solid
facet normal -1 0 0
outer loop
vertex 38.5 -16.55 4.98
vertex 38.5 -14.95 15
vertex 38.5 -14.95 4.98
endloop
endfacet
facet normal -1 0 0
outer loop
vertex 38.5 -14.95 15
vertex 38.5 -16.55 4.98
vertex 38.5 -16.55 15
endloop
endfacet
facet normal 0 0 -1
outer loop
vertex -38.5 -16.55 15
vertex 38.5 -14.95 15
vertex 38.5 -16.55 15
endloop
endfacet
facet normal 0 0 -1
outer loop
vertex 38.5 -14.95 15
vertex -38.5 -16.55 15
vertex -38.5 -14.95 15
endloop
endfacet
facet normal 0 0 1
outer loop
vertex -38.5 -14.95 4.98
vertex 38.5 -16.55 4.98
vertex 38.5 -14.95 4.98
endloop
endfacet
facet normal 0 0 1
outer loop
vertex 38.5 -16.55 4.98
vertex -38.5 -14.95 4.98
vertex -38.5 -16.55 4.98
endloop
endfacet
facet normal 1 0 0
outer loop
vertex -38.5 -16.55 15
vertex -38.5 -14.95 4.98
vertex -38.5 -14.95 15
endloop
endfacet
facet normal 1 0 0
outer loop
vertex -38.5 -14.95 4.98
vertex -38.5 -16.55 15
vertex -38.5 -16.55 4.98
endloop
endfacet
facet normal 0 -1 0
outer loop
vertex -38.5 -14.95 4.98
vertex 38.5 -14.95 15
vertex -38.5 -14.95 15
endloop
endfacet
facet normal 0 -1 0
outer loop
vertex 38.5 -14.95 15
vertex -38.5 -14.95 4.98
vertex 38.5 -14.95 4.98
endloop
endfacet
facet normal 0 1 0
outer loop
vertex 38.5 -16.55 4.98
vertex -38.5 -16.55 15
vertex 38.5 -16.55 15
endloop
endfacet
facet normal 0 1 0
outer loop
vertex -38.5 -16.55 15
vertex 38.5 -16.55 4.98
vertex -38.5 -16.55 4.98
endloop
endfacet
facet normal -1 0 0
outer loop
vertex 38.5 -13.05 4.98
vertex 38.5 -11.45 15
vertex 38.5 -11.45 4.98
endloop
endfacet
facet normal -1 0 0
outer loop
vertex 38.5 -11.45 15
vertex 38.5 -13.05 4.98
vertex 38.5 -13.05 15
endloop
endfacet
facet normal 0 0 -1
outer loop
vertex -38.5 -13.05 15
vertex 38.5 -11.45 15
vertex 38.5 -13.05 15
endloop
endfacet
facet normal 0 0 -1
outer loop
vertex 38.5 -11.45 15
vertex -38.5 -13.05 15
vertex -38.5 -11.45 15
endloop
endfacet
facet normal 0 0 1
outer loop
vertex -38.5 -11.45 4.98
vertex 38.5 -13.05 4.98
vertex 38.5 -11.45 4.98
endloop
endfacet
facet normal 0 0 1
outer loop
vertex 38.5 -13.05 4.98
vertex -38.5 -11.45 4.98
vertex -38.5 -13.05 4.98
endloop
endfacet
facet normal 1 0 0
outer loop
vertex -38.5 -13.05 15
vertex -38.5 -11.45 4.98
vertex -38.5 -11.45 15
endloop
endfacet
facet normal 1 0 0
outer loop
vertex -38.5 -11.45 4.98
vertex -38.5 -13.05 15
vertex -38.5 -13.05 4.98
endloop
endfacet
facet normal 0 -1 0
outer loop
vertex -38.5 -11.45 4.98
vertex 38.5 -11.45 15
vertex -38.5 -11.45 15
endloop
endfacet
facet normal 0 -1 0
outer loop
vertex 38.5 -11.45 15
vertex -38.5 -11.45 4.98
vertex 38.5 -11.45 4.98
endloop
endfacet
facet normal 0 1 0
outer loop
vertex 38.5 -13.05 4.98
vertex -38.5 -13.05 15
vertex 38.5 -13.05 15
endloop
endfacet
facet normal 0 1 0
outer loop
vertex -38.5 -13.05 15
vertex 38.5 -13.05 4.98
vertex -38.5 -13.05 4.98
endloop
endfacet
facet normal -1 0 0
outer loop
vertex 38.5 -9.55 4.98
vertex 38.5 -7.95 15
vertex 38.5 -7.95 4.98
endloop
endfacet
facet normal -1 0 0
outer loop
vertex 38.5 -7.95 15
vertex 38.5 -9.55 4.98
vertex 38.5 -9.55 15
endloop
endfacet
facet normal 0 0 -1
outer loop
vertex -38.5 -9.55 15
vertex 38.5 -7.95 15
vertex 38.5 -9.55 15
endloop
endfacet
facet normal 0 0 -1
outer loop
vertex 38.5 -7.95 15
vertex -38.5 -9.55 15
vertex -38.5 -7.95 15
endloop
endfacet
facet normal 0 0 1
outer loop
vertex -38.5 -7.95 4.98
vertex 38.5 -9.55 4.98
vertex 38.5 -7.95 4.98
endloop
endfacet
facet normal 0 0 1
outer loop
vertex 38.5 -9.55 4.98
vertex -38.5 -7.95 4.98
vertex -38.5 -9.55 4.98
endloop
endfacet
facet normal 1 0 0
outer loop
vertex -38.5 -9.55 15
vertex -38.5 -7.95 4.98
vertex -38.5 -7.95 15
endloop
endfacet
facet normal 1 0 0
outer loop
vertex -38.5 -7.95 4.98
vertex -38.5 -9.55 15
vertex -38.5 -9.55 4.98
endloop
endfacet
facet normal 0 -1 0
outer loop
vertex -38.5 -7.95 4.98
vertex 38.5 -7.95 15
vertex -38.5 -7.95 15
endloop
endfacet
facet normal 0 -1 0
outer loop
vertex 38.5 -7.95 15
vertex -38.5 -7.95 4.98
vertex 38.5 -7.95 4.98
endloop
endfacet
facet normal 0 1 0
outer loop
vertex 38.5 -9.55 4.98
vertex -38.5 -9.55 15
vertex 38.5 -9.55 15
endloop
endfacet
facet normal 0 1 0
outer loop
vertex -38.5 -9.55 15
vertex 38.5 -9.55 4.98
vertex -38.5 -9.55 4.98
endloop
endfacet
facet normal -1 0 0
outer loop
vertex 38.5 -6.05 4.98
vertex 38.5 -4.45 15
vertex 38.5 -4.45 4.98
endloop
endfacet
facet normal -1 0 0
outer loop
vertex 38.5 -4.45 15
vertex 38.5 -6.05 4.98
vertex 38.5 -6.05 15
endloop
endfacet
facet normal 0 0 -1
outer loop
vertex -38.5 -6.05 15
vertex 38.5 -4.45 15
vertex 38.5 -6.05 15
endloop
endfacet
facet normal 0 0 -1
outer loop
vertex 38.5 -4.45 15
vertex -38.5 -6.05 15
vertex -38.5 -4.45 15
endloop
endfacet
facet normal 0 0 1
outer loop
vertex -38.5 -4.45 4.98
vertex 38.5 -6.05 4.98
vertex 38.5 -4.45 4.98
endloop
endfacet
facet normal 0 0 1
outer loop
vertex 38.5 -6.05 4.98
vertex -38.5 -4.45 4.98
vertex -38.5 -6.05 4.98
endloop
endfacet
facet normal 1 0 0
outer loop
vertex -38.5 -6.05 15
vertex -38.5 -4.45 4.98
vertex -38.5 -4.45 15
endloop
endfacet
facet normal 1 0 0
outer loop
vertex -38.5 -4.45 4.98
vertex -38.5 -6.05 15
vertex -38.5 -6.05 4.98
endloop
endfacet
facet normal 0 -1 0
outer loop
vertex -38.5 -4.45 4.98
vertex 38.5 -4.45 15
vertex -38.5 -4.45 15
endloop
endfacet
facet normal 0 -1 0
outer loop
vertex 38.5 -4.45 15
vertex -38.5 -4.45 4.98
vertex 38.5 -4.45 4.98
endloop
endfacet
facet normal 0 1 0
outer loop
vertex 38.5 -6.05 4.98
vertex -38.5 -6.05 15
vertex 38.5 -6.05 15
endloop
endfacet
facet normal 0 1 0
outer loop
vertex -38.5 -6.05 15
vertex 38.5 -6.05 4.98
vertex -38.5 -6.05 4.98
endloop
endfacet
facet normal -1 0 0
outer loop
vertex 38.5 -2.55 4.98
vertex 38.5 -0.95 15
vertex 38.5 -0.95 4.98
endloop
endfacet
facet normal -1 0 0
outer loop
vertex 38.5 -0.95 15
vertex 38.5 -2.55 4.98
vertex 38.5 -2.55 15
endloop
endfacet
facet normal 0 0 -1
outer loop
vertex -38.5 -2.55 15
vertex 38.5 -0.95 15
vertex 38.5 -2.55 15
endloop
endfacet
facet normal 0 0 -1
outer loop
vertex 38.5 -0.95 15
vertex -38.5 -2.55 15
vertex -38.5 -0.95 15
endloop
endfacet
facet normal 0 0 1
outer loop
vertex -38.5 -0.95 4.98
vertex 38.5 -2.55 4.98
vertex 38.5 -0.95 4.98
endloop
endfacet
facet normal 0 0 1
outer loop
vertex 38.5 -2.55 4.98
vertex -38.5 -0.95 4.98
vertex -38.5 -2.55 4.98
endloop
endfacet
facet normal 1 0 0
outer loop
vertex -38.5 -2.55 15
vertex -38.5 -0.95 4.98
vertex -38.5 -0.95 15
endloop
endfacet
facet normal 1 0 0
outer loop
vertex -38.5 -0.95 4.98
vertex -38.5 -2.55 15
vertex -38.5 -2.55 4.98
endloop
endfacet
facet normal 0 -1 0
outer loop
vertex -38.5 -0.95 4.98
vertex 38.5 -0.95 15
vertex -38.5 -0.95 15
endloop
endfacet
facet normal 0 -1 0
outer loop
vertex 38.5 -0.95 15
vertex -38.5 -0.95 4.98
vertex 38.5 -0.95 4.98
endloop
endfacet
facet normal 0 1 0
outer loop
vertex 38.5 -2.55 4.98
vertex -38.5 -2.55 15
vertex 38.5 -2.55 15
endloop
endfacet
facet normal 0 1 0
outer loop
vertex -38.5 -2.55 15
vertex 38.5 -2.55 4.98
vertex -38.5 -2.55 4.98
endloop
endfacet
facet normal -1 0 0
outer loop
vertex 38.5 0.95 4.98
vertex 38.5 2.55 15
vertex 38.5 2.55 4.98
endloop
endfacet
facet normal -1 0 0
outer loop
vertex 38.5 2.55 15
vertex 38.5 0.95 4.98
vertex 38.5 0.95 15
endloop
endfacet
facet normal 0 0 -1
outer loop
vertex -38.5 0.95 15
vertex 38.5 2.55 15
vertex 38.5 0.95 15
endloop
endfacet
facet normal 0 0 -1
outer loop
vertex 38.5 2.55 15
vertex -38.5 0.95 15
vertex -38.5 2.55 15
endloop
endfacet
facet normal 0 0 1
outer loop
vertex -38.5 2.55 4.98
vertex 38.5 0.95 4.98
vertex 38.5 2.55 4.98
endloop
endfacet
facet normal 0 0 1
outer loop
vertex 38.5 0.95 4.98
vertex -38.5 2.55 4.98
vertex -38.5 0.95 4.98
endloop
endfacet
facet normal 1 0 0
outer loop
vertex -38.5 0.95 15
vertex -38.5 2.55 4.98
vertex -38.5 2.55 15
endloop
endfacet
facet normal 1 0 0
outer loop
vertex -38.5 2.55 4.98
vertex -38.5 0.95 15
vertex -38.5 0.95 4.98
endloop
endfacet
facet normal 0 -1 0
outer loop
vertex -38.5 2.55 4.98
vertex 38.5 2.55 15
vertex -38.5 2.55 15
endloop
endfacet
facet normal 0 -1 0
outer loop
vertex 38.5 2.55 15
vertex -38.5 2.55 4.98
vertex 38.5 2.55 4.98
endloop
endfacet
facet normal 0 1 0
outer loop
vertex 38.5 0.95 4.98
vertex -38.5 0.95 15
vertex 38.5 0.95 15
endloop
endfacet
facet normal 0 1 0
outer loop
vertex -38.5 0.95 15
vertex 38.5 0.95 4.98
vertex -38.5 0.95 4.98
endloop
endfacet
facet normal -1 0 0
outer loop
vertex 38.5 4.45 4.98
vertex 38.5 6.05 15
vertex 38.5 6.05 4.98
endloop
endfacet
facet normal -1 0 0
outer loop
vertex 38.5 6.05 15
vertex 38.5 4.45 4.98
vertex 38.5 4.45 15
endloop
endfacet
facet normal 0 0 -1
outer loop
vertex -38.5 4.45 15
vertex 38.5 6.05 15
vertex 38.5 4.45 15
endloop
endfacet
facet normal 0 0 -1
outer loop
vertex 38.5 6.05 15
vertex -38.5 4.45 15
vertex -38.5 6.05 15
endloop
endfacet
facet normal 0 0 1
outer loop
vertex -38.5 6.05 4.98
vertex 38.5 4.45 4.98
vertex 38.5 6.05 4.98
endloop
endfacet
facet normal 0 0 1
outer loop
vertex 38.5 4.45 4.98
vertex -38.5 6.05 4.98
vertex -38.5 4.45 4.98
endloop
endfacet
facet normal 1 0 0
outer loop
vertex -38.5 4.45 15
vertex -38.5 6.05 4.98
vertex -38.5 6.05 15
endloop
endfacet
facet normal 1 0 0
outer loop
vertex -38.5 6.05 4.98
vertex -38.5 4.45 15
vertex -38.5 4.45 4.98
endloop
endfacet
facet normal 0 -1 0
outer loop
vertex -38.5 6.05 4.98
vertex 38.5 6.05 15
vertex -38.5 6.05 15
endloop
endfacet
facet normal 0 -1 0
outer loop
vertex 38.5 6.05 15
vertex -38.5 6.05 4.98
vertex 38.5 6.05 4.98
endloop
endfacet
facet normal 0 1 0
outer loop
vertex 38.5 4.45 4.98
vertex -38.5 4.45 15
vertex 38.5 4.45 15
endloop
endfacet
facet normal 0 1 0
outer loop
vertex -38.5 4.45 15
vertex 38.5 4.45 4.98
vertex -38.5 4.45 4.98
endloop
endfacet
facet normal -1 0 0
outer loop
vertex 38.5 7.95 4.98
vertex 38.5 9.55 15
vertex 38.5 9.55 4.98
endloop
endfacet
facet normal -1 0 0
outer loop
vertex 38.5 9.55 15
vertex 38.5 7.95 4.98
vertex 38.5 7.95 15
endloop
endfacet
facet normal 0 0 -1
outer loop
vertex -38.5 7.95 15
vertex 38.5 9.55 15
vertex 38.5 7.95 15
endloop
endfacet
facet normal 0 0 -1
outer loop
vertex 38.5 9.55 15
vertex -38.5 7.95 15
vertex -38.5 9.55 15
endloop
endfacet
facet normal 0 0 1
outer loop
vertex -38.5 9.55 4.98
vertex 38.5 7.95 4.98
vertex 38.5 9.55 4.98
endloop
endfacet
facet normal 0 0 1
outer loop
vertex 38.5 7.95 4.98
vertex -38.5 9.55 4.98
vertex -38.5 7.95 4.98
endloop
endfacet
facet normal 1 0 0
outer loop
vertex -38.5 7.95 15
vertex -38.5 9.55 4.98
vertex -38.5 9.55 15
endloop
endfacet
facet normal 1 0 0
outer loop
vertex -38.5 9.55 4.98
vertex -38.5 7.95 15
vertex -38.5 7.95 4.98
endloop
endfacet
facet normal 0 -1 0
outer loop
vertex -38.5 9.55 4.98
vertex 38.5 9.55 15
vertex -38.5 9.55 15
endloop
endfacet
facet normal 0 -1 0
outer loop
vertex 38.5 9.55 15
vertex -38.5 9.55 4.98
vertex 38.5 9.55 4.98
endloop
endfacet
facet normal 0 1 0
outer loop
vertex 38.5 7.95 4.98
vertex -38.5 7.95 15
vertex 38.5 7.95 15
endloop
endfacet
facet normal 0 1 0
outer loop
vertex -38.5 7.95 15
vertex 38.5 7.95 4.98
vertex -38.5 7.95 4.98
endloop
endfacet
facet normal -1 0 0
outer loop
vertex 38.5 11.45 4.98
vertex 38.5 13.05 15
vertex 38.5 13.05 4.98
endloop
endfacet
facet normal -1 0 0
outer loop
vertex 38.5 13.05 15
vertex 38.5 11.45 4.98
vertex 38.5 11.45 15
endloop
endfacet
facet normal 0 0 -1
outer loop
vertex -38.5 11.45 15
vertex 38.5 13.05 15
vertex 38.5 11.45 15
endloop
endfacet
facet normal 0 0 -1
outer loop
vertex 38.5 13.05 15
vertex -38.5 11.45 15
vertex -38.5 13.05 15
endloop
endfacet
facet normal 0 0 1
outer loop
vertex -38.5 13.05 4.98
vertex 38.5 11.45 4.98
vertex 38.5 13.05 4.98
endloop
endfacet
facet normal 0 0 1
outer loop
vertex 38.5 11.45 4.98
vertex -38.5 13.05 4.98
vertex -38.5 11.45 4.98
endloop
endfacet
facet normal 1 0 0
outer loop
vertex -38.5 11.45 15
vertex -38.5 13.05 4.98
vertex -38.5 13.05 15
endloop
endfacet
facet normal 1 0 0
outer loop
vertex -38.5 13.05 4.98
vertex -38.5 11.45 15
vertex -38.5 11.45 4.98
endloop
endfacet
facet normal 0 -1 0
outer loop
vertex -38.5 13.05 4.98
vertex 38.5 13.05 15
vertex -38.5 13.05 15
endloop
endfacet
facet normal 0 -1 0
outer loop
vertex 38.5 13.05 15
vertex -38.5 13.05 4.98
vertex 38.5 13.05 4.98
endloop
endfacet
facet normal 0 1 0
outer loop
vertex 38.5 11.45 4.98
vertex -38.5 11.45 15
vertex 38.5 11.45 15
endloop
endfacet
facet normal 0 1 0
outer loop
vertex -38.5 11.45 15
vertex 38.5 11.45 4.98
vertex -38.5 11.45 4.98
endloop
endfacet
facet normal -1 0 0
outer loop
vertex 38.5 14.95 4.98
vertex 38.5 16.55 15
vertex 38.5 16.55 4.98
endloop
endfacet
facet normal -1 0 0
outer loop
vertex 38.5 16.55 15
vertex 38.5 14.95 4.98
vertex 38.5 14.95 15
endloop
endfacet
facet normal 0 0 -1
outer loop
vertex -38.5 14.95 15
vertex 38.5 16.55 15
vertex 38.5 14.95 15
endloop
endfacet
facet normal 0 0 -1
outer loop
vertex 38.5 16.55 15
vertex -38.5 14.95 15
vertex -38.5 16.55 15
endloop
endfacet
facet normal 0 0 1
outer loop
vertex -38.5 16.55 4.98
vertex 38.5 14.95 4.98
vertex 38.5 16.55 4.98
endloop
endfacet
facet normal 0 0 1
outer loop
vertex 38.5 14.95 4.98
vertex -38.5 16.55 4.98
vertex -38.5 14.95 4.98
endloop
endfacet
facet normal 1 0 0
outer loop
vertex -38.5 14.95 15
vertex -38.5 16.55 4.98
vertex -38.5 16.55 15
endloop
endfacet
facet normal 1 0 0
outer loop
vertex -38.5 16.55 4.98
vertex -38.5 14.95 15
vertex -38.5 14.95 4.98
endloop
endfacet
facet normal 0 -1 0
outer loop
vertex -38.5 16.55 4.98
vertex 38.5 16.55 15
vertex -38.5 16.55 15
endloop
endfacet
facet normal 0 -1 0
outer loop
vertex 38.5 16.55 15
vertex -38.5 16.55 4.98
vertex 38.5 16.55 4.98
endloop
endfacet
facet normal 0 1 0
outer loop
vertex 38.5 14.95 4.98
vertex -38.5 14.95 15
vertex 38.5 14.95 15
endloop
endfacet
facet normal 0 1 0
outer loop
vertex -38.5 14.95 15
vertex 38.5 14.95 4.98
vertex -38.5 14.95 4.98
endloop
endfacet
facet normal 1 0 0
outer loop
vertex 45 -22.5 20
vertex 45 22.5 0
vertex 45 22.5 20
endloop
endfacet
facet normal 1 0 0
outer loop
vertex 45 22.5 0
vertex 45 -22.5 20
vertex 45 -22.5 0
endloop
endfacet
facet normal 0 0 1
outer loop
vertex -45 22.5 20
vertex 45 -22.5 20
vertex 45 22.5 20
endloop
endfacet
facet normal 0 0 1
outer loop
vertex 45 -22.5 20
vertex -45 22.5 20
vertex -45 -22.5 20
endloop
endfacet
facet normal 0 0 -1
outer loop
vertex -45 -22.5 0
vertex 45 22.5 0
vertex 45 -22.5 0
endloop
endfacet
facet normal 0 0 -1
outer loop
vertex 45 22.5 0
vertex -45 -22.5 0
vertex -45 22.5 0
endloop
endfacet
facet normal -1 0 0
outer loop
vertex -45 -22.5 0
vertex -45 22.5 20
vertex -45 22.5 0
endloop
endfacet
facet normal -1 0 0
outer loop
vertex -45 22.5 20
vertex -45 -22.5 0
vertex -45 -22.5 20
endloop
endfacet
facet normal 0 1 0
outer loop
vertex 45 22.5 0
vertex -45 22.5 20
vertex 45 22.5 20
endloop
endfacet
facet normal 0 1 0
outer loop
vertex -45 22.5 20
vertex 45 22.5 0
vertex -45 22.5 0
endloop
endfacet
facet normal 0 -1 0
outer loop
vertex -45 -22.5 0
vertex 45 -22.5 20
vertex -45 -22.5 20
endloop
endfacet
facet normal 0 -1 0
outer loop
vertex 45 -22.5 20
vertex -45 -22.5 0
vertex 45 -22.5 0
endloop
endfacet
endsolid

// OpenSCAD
$fn = 64;

// Dimensions in millimeters
rack_length = 90;   // X-axis length of base
rack_width = 45;    // Y-axis width of base
rack_height = 20;   // Z-axis height of base

slot_length = 77; // X-axis length of each slot
slot_width = 1.6; // Y-axis width of each slot
slot_depth = 10;  // Z-axis depth of each slot (from top surface)

num_slots = 10; // Number of slots
slot_center_spacing = 3.5; // Center-to-center spacing between slots (Y-axis)

// Calculate starting Y position for slot centers (centered on rack)
slot_start_y = -((num_slots - 1) * slot_center_spacing) / 2;

// Hole dimensions for Z-axis (extended 0.01mm beyond rack top and slot bottom)
hole_z_start = rack_height - slot_depth - 0.01;
hole_z_end = rack_height + 0.01;
hole_z_height = hole_z_end - hole_z_start;

// Base block (centered at origin in X/Y, resting on XY plane at Z=0)
difference() {
    // Translate base up by rack_height/2 to start at Z=0
    translate([0, 0, rack_height/2])
        cube([rack_length, rack_width, rack_height], center=true);
    
    for (i = [0 : num_slots - 1]) {
        // Calculate Y center for current slot
        y_center = slot_start_y + i * slot_center_spacing;
        
        // Create hole cube (centered in X/Y for slot, placed at correct Z)
        translate([0, y_center, hole_z_start])
            cube([slot_length, slot_width, hole_z_height], center = true);
    }
}
